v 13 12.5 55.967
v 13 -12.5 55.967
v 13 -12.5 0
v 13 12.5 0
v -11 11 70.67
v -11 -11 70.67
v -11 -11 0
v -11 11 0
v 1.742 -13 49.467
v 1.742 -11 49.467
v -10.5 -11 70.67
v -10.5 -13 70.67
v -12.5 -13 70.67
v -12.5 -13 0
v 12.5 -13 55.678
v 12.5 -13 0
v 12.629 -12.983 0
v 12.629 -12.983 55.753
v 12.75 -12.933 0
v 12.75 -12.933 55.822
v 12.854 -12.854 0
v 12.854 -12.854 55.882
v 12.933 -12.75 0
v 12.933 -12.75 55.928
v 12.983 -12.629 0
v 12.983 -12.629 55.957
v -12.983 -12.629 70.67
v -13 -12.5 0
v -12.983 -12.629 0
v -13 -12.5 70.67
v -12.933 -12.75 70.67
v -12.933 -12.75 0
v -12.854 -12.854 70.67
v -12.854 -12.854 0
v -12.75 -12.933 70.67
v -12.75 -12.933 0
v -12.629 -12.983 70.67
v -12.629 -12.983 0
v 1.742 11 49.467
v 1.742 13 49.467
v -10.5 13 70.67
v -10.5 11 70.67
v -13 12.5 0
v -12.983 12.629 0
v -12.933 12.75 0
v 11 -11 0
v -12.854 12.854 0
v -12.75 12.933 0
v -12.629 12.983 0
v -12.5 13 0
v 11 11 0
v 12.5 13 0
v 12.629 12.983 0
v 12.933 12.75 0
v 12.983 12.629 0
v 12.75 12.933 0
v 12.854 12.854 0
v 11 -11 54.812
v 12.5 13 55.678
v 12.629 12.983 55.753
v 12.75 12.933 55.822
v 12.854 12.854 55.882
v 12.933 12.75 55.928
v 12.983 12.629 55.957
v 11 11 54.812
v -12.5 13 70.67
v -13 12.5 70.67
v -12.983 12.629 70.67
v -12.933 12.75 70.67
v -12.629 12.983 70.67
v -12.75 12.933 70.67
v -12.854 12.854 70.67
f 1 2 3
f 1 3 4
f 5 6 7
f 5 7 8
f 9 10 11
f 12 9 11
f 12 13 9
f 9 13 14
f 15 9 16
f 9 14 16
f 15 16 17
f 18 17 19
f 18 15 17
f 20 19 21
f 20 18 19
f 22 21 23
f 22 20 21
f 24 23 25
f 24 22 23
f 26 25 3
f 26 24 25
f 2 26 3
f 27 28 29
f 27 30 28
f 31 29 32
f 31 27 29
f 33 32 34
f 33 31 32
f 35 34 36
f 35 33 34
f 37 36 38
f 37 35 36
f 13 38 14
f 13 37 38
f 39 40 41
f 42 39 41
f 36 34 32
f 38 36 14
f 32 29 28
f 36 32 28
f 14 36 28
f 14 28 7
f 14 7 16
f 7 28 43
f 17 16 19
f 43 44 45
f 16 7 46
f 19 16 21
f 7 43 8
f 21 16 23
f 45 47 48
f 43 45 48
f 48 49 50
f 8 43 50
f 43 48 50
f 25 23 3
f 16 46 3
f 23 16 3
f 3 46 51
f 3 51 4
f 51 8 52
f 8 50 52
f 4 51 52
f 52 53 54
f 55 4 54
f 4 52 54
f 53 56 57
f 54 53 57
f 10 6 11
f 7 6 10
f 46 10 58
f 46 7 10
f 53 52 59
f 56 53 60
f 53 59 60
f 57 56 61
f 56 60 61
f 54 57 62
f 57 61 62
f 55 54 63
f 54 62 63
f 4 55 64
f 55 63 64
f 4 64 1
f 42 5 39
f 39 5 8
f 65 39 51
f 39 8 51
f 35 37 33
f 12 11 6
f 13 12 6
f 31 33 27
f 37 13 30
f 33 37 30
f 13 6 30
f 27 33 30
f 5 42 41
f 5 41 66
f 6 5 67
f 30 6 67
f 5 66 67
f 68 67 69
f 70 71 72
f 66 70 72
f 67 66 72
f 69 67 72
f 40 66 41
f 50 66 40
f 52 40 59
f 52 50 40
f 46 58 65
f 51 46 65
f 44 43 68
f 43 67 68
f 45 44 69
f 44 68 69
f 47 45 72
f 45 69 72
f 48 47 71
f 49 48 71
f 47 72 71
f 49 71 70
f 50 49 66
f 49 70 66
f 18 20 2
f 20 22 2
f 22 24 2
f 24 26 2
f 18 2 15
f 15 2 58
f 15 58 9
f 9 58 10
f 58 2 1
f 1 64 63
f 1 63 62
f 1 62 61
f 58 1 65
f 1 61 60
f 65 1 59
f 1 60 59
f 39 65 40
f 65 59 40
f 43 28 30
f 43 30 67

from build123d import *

# Parameters (mm, degrees)
F0_W     = 26
F0_H     = 26
F0_W_2   = 22
F0_H_2   = 22
F1_DEPTH = 75
F3_DEPTH = 26.001
F4_R     = 0.5


# Not quite as in the source:
# - a feature names something its author has since deleted; it is built from what else it names


with BuildPart() as f1:
    # F0 (on Top) → F1 (new body)
    with BuildSketch(Plane.XY):
        Rectangle(F0_W, F0_H)
        Rectangle(F0_W_2, F0_H_2, mode=Mode.SUBTRACT)
    extrude(amount=F1_DEPTH)

    # F2 (on face) → F3 (cut, through all)
    with BuildSketch(Plane(origin=(0, 13, 0), x_dir=(-1, 0, 0), z_dir=(0, 1, 0))):
        Polygon((-13, 55.9666790032), (-1.7416697508, 49.4666790032), (10.5, 70.6698729811), (13, 70.6698729811), (13, 75), (-8.7376814767, 75), (-13, 75), align=None)
    extrude(amount=-F3_DEPTH, mode=Mode.SUBTRACT)

    # F4
    f4_edges = [f1.edges().sort_by_distance(p)[0] for p in [
        (13, 13, 27.98334),
        (-13, 13, 35.334936),
        (-13, -13, 35.334936),
        (13, -13, 27.98334),
    ]]
    fillet(f4_edges, radius=F4_R)


solid = f1.part
